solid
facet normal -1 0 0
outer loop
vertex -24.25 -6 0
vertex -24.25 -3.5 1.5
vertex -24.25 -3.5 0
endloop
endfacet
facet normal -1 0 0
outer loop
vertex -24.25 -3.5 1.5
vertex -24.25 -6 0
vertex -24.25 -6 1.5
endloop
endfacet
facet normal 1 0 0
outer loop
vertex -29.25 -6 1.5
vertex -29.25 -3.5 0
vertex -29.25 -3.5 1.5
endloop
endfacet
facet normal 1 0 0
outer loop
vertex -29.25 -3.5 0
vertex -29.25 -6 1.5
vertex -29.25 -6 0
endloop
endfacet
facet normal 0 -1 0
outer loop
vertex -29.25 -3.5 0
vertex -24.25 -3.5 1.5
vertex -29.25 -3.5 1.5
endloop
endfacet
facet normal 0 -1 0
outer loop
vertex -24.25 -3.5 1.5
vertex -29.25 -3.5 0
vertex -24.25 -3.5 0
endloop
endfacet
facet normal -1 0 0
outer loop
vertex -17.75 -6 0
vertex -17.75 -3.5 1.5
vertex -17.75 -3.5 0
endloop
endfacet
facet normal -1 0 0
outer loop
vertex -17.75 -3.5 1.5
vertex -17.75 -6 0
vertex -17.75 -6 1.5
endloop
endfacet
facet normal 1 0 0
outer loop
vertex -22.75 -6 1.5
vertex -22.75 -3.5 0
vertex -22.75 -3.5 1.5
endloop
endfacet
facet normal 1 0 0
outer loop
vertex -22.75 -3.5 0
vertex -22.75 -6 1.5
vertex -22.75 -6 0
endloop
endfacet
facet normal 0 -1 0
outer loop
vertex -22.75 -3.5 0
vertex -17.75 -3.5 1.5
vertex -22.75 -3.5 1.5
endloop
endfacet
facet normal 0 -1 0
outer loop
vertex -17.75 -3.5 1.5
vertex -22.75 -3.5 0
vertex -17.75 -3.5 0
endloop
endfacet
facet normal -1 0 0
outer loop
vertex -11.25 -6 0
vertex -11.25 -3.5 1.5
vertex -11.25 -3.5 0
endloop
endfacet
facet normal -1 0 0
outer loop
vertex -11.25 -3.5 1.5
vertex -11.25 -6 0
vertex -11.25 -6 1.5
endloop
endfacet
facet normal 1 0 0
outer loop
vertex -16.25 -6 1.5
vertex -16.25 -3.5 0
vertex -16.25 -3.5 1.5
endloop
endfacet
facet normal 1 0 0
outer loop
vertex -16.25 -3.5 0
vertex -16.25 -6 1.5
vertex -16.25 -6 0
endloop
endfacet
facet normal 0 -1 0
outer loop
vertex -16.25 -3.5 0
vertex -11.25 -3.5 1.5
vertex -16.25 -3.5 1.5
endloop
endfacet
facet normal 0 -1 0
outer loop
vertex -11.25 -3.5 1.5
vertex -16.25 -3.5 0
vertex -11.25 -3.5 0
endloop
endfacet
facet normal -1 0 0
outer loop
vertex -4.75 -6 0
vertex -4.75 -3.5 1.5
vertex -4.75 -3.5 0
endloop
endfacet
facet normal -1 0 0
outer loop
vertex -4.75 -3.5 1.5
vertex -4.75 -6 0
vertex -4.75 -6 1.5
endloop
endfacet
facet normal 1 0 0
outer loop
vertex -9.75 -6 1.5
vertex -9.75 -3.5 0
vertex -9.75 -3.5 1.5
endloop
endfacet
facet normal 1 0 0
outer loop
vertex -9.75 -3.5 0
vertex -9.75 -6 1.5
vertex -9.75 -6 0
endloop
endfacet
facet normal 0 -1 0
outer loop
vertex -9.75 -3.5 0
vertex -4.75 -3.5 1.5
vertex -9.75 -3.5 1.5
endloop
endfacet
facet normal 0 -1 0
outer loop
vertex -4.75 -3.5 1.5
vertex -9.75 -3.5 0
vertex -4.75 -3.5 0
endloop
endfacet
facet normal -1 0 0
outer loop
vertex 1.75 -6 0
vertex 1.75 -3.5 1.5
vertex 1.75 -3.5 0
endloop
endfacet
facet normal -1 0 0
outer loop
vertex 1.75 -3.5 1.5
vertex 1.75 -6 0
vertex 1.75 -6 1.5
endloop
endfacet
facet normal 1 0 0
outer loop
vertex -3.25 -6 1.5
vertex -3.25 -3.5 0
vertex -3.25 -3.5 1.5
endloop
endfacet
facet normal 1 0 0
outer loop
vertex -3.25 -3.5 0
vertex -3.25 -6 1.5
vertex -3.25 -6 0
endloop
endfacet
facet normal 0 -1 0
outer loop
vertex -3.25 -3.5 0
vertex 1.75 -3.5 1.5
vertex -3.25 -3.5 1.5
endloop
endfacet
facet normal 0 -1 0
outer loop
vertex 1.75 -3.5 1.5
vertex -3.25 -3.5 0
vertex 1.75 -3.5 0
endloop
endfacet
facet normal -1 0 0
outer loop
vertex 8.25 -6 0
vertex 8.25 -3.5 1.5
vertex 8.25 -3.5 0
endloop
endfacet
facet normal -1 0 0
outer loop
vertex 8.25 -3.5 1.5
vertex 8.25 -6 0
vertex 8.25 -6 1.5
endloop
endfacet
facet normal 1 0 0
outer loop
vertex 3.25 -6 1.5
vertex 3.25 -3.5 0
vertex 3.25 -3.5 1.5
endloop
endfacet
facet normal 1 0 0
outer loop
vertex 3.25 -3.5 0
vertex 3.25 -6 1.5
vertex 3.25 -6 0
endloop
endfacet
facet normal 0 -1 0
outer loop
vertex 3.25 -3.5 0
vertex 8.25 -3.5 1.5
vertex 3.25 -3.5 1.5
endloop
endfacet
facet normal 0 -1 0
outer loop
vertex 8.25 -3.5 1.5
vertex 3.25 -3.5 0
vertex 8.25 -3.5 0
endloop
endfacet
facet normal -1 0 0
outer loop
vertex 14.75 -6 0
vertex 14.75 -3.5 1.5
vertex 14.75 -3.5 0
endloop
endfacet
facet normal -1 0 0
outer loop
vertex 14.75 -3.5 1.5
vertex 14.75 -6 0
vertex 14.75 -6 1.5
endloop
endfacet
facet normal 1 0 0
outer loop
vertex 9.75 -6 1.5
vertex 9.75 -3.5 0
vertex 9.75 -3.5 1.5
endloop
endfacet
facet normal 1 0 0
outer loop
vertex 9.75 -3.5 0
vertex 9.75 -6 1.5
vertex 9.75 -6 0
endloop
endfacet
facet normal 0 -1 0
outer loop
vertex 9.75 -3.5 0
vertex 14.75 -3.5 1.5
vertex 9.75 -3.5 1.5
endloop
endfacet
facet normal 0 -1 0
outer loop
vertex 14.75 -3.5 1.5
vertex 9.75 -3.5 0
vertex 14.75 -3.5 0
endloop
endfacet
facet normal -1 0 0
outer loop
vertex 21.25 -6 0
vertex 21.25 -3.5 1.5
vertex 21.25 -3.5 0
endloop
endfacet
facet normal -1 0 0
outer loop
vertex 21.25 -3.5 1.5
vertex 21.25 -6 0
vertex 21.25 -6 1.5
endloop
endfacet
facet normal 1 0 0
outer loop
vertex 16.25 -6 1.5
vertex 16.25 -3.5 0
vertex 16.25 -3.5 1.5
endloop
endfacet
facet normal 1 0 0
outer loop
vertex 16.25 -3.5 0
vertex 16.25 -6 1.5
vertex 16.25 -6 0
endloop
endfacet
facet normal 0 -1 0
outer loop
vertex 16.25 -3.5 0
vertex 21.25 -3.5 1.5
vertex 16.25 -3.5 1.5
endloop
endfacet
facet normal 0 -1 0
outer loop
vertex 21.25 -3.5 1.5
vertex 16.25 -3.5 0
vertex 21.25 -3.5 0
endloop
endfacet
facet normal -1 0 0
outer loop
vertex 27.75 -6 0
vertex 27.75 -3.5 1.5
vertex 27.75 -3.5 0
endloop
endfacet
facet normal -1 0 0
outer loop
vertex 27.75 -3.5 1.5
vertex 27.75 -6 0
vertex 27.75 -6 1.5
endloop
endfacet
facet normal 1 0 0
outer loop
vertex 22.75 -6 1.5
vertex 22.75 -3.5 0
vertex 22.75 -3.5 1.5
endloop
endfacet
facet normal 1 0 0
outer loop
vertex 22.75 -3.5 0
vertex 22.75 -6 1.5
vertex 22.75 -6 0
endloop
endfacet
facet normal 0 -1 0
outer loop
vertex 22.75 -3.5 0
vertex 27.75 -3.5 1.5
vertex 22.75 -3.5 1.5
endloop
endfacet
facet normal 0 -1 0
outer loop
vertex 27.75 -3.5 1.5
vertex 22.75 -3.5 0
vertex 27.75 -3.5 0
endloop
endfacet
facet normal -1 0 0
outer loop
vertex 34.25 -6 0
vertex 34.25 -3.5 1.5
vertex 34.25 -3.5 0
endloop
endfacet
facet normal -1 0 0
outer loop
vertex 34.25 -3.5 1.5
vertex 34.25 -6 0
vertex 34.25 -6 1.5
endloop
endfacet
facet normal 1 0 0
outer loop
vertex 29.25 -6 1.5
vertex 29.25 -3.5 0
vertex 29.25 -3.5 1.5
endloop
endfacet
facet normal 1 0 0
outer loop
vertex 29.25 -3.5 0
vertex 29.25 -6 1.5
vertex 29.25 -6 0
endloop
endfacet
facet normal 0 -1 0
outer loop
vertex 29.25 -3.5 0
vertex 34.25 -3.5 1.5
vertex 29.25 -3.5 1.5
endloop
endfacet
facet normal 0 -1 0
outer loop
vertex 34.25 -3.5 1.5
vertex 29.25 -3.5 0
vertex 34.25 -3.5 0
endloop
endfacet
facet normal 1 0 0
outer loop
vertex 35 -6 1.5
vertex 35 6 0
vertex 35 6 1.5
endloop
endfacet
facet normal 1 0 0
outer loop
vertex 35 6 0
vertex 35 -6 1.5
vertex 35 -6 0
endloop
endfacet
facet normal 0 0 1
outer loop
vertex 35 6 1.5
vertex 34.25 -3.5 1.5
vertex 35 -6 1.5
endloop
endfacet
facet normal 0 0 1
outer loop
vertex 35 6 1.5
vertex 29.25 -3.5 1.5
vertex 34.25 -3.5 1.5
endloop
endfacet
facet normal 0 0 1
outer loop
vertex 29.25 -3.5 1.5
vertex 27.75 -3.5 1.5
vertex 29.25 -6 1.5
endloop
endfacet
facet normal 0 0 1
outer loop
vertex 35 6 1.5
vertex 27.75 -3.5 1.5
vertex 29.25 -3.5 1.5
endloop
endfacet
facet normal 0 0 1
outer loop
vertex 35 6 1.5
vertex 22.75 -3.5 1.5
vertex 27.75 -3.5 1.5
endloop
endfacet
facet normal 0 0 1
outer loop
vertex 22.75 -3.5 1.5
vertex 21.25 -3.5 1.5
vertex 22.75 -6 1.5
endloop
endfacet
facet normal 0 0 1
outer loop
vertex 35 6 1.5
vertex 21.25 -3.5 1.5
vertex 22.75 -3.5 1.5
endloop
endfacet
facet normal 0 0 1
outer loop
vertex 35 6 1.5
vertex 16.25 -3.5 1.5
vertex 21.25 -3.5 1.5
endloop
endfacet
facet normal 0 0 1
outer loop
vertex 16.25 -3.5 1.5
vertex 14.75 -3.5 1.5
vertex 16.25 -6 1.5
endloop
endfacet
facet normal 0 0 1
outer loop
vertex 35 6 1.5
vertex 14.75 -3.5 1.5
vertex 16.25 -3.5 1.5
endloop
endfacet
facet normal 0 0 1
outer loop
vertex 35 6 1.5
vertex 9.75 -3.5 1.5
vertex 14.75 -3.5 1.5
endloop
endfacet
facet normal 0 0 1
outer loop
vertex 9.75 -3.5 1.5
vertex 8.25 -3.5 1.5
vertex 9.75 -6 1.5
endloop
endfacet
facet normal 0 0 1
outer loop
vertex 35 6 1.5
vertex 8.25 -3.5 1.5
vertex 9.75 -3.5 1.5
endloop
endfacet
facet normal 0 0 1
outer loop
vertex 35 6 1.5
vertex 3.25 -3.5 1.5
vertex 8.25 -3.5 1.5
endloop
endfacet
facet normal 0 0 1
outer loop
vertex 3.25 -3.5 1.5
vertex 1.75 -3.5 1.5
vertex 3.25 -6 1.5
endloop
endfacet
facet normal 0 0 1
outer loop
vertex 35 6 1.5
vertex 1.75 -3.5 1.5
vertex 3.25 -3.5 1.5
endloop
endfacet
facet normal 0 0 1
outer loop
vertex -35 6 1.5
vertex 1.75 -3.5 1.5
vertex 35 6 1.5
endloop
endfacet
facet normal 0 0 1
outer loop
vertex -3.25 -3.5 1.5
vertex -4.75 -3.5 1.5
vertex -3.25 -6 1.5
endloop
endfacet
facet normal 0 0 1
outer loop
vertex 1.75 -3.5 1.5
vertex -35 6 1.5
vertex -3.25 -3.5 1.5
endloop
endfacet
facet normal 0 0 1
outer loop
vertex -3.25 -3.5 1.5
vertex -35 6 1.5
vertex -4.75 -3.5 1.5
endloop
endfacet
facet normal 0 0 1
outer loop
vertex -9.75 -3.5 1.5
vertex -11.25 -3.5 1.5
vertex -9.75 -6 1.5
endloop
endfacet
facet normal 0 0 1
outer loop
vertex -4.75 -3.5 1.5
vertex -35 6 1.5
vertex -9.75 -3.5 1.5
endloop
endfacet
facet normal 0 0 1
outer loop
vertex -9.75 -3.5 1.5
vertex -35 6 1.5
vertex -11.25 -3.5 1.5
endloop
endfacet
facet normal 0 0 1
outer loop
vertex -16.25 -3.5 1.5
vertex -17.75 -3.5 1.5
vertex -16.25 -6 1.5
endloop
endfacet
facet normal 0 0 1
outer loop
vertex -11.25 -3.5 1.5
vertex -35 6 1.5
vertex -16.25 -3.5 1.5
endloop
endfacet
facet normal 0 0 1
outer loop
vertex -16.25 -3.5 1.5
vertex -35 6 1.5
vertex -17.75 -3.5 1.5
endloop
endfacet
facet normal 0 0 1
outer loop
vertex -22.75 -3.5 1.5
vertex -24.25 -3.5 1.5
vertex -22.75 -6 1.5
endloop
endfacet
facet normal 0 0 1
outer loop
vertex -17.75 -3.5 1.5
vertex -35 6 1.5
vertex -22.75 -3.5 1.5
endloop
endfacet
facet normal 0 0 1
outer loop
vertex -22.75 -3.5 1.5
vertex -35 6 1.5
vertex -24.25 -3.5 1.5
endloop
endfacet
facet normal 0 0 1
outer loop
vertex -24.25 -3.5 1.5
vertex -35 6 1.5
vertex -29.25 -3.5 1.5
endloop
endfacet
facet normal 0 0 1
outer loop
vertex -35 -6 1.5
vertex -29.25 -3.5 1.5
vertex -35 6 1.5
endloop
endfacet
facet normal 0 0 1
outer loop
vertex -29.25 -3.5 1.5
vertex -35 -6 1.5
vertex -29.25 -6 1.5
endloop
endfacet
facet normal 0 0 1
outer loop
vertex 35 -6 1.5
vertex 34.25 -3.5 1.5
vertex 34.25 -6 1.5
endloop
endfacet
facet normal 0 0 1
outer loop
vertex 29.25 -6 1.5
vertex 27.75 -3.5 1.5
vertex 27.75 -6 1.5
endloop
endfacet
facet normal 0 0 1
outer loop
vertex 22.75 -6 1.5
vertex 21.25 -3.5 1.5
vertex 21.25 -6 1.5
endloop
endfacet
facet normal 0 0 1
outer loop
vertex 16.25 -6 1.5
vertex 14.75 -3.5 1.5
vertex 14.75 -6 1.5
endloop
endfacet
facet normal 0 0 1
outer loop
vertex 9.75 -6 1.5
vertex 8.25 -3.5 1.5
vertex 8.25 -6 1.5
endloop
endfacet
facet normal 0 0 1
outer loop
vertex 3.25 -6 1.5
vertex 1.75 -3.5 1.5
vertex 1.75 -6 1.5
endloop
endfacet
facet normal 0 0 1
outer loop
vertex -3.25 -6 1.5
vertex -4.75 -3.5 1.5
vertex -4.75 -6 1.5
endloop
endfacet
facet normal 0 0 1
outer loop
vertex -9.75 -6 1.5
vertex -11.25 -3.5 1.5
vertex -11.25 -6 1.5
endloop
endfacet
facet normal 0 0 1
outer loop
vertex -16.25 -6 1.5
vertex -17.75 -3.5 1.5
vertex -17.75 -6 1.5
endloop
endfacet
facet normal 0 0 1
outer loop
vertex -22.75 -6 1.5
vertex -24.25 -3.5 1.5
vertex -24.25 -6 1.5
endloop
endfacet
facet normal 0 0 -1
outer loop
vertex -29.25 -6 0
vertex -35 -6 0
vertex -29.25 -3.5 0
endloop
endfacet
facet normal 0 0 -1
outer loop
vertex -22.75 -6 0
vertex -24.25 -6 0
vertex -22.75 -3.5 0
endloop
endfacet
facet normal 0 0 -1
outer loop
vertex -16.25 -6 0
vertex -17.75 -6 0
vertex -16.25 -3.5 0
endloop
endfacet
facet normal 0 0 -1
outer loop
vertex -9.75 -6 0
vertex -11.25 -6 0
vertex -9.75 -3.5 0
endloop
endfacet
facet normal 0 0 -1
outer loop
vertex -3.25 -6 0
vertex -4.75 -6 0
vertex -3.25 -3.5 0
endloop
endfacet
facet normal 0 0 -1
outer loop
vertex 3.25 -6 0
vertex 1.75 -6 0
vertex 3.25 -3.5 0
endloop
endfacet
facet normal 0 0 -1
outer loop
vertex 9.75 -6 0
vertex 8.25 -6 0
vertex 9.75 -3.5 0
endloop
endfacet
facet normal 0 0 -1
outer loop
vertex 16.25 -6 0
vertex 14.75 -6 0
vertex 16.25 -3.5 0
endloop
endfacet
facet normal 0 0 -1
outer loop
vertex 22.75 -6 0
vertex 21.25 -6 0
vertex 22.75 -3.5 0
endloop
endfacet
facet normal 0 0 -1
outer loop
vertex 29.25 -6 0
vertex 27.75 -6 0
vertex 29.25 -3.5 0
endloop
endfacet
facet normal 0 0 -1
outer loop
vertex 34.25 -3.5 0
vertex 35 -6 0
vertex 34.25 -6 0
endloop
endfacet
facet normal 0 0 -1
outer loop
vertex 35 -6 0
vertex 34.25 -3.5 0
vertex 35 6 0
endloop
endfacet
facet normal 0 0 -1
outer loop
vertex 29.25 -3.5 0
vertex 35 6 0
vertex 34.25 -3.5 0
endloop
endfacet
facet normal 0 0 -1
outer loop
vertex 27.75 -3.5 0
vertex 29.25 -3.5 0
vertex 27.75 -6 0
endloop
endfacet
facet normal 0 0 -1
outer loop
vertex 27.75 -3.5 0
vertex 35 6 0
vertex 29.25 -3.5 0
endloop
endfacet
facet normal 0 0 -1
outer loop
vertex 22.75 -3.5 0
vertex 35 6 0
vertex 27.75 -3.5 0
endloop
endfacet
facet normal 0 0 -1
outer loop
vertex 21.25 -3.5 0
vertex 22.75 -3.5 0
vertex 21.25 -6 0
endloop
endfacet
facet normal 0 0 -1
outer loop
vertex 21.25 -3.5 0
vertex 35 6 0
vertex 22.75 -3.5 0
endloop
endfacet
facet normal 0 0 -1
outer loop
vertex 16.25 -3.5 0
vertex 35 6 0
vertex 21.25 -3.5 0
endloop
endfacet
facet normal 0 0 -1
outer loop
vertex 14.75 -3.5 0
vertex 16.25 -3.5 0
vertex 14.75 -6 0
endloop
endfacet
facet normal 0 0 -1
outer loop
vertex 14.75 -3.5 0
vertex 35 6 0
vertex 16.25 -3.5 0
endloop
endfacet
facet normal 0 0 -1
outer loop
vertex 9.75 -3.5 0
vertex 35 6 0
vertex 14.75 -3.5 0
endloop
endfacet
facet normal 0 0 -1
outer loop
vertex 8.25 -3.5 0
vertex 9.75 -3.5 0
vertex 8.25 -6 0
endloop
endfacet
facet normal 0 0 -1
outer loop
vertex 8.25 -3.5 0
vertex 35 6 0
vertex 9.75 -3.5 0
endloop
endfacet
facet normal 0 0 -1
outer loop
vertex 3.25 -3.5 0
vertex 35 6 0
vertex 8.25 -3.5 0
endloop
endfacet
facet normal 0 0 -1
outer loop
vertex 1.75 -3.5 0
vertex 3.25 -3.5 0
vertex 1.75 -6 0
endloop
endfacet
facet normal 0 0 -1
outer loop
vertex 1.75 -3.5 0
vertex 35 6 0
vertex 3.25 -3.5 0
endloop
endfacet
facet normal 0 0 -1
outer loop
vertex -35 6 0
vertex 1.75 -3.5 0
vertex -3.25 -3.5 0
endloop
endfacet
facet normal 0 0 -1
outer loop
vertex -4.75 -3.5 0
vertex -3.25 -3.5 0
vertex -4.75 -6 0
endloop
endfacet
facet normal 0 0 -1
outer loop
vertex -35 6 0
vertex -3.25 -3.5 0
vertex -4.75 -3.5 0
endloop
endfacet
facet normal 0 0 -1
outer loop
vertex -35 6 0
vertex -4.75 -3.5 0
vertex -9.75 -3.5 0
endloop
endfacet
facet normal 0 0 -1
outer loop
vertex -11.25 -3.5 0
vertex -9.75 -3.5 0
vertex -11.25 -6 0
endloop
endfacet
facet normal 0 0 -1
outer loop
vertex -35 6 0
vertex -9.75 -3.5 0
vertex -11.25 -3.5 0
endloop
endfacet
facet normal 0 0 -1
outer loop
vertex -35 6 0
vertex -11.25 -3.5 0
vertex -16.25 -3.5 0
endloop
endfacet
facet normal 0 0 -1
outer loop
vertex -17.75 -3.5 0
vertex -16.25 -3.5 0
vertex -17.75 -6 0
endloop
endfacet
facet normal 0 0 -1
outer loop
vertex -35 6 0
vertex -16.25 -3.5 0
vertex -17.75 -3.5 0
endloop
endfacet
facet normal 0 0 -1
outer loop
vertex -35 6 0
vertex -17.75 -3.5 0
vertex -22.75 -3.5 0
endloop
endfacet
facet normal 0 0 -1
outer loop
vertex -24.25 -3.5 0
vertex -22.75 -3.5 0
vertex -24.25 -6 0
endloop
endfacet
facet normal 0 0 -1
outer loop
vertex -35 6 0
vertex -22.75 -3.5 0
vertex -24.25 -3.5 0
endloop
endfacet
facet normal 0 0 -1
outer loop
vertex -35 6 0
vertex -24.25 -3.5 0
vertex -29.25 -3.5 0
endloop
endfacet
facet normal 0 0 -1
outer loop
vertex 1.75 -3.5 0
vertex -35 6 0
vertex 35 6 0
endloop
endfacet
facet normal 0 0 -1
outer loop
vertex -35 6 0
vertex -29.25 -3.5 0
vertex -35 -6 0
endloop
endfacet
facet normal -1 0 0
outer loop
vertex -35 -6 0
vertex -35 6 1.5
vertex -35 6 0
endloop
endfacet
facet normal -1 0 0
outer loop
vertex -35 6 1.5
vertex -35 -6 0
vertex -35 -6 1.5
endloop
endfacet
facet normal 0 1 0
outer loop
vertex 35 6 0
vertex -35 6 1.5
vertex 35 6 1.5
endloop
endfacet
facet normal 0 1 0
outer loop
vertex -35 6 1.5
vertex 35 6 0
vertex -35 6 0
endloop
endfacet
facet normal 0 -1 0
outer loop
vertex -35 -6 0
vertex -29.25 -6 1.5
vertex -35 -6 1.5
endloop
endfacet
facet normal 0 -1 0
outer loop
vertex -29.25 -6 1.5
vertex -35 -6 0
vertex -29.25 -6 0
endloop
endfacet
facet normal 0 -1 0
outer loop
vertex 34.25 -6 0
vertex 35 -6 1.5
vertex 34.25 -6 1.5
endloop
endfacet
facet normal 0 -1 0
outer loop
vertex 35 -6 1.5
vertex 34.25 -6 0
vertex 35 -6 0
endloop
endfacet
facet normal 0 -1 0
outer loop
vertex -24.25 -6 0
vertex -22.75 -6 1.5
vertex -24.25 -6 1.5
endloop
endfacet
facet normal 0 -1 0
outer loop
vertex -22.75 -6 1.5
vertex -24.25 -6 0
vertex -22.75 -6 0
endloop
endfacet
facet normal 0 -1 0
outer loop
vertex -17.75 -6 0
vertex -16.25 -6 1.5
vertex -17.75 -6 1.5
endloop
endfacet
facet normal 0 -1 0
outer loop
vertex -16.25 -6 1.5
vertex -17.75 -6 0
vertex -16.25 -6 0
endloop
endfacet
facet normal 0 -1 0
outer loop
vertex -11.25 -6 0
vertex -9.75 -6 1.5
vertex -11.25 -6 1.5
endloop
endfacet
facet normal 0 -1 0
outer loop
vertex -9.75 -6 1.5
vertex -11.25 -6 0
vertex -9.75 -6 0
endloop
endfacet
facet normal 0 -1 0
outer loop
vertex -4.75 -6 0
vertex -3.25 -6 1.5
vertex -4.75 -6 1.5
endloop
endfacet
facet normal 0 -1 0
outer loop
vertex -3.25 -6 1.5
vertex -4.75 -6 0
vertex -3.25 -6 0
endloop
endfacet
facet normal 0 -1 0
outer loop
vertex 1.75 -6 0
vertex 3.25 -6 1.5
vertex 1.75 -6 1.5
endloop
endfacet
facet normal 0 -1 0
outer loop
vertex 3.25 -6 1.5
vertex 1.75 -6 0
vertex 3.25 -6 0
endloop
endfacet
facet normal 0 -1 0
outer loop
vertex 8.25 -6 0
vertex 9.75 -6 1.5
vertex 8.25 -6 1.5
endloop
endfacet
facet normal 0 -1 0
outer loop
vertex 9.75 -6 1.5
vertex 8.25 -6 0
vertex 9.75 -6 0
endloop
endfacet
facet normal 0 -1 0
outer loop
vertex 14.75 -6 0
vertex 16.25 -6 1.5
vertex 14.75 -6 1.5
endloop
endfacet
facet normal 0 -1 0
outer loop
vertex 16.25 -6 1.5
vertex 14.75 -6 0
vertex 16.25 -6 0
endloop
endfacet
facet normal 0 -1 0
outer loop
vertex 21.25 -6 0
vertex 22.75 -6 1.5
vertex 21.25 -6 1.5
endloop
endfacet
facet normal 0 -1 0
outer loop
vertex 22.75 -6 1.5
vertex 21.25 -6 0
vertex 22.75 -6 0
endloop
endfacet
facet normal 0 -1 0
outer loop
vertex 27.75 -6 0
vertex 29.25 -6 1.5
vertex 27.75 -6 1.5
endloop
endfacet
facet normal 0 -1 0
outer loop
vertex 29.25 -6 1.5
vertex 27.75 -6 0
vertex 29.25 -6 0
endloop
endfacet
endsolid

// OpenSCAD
// 10-well agarose gel comb, printed lying flat
// Units: mm

plate_t      = 1.5;   // plate thickness (Z)
spine_l      = 70;    // spine length (X)
spine_w      = 12;    // spine width (Y)
teeth_n      = 10;    // number of teeth
teeth_w      = 5;     // tooth width (X)
teeth_l      = 12;    // tooth length (Y)
teeth_gap    = 1.5;   // gap between teeth (X)
overcut      = 0.5;   // cutter overshoot past faces

$fn = 64;

pitch = teeth_w + teeth_gap;

difference() {
    // Spine
    translate([-spine_l/2, -spine_w/2, 0])
        cube([spine_l, spine_w, plate_t]);

    // Teeth
    for (i = [0 : teeth_n - 1])
        translate([(i - (teeth_n - 1)/2) * pitch, -spine_w/2 - teeth_l, -overcut])
            cube([teeth_w, teeth_l + plate_t + 2*overcut, plate_t + 2*overcut]);
}
